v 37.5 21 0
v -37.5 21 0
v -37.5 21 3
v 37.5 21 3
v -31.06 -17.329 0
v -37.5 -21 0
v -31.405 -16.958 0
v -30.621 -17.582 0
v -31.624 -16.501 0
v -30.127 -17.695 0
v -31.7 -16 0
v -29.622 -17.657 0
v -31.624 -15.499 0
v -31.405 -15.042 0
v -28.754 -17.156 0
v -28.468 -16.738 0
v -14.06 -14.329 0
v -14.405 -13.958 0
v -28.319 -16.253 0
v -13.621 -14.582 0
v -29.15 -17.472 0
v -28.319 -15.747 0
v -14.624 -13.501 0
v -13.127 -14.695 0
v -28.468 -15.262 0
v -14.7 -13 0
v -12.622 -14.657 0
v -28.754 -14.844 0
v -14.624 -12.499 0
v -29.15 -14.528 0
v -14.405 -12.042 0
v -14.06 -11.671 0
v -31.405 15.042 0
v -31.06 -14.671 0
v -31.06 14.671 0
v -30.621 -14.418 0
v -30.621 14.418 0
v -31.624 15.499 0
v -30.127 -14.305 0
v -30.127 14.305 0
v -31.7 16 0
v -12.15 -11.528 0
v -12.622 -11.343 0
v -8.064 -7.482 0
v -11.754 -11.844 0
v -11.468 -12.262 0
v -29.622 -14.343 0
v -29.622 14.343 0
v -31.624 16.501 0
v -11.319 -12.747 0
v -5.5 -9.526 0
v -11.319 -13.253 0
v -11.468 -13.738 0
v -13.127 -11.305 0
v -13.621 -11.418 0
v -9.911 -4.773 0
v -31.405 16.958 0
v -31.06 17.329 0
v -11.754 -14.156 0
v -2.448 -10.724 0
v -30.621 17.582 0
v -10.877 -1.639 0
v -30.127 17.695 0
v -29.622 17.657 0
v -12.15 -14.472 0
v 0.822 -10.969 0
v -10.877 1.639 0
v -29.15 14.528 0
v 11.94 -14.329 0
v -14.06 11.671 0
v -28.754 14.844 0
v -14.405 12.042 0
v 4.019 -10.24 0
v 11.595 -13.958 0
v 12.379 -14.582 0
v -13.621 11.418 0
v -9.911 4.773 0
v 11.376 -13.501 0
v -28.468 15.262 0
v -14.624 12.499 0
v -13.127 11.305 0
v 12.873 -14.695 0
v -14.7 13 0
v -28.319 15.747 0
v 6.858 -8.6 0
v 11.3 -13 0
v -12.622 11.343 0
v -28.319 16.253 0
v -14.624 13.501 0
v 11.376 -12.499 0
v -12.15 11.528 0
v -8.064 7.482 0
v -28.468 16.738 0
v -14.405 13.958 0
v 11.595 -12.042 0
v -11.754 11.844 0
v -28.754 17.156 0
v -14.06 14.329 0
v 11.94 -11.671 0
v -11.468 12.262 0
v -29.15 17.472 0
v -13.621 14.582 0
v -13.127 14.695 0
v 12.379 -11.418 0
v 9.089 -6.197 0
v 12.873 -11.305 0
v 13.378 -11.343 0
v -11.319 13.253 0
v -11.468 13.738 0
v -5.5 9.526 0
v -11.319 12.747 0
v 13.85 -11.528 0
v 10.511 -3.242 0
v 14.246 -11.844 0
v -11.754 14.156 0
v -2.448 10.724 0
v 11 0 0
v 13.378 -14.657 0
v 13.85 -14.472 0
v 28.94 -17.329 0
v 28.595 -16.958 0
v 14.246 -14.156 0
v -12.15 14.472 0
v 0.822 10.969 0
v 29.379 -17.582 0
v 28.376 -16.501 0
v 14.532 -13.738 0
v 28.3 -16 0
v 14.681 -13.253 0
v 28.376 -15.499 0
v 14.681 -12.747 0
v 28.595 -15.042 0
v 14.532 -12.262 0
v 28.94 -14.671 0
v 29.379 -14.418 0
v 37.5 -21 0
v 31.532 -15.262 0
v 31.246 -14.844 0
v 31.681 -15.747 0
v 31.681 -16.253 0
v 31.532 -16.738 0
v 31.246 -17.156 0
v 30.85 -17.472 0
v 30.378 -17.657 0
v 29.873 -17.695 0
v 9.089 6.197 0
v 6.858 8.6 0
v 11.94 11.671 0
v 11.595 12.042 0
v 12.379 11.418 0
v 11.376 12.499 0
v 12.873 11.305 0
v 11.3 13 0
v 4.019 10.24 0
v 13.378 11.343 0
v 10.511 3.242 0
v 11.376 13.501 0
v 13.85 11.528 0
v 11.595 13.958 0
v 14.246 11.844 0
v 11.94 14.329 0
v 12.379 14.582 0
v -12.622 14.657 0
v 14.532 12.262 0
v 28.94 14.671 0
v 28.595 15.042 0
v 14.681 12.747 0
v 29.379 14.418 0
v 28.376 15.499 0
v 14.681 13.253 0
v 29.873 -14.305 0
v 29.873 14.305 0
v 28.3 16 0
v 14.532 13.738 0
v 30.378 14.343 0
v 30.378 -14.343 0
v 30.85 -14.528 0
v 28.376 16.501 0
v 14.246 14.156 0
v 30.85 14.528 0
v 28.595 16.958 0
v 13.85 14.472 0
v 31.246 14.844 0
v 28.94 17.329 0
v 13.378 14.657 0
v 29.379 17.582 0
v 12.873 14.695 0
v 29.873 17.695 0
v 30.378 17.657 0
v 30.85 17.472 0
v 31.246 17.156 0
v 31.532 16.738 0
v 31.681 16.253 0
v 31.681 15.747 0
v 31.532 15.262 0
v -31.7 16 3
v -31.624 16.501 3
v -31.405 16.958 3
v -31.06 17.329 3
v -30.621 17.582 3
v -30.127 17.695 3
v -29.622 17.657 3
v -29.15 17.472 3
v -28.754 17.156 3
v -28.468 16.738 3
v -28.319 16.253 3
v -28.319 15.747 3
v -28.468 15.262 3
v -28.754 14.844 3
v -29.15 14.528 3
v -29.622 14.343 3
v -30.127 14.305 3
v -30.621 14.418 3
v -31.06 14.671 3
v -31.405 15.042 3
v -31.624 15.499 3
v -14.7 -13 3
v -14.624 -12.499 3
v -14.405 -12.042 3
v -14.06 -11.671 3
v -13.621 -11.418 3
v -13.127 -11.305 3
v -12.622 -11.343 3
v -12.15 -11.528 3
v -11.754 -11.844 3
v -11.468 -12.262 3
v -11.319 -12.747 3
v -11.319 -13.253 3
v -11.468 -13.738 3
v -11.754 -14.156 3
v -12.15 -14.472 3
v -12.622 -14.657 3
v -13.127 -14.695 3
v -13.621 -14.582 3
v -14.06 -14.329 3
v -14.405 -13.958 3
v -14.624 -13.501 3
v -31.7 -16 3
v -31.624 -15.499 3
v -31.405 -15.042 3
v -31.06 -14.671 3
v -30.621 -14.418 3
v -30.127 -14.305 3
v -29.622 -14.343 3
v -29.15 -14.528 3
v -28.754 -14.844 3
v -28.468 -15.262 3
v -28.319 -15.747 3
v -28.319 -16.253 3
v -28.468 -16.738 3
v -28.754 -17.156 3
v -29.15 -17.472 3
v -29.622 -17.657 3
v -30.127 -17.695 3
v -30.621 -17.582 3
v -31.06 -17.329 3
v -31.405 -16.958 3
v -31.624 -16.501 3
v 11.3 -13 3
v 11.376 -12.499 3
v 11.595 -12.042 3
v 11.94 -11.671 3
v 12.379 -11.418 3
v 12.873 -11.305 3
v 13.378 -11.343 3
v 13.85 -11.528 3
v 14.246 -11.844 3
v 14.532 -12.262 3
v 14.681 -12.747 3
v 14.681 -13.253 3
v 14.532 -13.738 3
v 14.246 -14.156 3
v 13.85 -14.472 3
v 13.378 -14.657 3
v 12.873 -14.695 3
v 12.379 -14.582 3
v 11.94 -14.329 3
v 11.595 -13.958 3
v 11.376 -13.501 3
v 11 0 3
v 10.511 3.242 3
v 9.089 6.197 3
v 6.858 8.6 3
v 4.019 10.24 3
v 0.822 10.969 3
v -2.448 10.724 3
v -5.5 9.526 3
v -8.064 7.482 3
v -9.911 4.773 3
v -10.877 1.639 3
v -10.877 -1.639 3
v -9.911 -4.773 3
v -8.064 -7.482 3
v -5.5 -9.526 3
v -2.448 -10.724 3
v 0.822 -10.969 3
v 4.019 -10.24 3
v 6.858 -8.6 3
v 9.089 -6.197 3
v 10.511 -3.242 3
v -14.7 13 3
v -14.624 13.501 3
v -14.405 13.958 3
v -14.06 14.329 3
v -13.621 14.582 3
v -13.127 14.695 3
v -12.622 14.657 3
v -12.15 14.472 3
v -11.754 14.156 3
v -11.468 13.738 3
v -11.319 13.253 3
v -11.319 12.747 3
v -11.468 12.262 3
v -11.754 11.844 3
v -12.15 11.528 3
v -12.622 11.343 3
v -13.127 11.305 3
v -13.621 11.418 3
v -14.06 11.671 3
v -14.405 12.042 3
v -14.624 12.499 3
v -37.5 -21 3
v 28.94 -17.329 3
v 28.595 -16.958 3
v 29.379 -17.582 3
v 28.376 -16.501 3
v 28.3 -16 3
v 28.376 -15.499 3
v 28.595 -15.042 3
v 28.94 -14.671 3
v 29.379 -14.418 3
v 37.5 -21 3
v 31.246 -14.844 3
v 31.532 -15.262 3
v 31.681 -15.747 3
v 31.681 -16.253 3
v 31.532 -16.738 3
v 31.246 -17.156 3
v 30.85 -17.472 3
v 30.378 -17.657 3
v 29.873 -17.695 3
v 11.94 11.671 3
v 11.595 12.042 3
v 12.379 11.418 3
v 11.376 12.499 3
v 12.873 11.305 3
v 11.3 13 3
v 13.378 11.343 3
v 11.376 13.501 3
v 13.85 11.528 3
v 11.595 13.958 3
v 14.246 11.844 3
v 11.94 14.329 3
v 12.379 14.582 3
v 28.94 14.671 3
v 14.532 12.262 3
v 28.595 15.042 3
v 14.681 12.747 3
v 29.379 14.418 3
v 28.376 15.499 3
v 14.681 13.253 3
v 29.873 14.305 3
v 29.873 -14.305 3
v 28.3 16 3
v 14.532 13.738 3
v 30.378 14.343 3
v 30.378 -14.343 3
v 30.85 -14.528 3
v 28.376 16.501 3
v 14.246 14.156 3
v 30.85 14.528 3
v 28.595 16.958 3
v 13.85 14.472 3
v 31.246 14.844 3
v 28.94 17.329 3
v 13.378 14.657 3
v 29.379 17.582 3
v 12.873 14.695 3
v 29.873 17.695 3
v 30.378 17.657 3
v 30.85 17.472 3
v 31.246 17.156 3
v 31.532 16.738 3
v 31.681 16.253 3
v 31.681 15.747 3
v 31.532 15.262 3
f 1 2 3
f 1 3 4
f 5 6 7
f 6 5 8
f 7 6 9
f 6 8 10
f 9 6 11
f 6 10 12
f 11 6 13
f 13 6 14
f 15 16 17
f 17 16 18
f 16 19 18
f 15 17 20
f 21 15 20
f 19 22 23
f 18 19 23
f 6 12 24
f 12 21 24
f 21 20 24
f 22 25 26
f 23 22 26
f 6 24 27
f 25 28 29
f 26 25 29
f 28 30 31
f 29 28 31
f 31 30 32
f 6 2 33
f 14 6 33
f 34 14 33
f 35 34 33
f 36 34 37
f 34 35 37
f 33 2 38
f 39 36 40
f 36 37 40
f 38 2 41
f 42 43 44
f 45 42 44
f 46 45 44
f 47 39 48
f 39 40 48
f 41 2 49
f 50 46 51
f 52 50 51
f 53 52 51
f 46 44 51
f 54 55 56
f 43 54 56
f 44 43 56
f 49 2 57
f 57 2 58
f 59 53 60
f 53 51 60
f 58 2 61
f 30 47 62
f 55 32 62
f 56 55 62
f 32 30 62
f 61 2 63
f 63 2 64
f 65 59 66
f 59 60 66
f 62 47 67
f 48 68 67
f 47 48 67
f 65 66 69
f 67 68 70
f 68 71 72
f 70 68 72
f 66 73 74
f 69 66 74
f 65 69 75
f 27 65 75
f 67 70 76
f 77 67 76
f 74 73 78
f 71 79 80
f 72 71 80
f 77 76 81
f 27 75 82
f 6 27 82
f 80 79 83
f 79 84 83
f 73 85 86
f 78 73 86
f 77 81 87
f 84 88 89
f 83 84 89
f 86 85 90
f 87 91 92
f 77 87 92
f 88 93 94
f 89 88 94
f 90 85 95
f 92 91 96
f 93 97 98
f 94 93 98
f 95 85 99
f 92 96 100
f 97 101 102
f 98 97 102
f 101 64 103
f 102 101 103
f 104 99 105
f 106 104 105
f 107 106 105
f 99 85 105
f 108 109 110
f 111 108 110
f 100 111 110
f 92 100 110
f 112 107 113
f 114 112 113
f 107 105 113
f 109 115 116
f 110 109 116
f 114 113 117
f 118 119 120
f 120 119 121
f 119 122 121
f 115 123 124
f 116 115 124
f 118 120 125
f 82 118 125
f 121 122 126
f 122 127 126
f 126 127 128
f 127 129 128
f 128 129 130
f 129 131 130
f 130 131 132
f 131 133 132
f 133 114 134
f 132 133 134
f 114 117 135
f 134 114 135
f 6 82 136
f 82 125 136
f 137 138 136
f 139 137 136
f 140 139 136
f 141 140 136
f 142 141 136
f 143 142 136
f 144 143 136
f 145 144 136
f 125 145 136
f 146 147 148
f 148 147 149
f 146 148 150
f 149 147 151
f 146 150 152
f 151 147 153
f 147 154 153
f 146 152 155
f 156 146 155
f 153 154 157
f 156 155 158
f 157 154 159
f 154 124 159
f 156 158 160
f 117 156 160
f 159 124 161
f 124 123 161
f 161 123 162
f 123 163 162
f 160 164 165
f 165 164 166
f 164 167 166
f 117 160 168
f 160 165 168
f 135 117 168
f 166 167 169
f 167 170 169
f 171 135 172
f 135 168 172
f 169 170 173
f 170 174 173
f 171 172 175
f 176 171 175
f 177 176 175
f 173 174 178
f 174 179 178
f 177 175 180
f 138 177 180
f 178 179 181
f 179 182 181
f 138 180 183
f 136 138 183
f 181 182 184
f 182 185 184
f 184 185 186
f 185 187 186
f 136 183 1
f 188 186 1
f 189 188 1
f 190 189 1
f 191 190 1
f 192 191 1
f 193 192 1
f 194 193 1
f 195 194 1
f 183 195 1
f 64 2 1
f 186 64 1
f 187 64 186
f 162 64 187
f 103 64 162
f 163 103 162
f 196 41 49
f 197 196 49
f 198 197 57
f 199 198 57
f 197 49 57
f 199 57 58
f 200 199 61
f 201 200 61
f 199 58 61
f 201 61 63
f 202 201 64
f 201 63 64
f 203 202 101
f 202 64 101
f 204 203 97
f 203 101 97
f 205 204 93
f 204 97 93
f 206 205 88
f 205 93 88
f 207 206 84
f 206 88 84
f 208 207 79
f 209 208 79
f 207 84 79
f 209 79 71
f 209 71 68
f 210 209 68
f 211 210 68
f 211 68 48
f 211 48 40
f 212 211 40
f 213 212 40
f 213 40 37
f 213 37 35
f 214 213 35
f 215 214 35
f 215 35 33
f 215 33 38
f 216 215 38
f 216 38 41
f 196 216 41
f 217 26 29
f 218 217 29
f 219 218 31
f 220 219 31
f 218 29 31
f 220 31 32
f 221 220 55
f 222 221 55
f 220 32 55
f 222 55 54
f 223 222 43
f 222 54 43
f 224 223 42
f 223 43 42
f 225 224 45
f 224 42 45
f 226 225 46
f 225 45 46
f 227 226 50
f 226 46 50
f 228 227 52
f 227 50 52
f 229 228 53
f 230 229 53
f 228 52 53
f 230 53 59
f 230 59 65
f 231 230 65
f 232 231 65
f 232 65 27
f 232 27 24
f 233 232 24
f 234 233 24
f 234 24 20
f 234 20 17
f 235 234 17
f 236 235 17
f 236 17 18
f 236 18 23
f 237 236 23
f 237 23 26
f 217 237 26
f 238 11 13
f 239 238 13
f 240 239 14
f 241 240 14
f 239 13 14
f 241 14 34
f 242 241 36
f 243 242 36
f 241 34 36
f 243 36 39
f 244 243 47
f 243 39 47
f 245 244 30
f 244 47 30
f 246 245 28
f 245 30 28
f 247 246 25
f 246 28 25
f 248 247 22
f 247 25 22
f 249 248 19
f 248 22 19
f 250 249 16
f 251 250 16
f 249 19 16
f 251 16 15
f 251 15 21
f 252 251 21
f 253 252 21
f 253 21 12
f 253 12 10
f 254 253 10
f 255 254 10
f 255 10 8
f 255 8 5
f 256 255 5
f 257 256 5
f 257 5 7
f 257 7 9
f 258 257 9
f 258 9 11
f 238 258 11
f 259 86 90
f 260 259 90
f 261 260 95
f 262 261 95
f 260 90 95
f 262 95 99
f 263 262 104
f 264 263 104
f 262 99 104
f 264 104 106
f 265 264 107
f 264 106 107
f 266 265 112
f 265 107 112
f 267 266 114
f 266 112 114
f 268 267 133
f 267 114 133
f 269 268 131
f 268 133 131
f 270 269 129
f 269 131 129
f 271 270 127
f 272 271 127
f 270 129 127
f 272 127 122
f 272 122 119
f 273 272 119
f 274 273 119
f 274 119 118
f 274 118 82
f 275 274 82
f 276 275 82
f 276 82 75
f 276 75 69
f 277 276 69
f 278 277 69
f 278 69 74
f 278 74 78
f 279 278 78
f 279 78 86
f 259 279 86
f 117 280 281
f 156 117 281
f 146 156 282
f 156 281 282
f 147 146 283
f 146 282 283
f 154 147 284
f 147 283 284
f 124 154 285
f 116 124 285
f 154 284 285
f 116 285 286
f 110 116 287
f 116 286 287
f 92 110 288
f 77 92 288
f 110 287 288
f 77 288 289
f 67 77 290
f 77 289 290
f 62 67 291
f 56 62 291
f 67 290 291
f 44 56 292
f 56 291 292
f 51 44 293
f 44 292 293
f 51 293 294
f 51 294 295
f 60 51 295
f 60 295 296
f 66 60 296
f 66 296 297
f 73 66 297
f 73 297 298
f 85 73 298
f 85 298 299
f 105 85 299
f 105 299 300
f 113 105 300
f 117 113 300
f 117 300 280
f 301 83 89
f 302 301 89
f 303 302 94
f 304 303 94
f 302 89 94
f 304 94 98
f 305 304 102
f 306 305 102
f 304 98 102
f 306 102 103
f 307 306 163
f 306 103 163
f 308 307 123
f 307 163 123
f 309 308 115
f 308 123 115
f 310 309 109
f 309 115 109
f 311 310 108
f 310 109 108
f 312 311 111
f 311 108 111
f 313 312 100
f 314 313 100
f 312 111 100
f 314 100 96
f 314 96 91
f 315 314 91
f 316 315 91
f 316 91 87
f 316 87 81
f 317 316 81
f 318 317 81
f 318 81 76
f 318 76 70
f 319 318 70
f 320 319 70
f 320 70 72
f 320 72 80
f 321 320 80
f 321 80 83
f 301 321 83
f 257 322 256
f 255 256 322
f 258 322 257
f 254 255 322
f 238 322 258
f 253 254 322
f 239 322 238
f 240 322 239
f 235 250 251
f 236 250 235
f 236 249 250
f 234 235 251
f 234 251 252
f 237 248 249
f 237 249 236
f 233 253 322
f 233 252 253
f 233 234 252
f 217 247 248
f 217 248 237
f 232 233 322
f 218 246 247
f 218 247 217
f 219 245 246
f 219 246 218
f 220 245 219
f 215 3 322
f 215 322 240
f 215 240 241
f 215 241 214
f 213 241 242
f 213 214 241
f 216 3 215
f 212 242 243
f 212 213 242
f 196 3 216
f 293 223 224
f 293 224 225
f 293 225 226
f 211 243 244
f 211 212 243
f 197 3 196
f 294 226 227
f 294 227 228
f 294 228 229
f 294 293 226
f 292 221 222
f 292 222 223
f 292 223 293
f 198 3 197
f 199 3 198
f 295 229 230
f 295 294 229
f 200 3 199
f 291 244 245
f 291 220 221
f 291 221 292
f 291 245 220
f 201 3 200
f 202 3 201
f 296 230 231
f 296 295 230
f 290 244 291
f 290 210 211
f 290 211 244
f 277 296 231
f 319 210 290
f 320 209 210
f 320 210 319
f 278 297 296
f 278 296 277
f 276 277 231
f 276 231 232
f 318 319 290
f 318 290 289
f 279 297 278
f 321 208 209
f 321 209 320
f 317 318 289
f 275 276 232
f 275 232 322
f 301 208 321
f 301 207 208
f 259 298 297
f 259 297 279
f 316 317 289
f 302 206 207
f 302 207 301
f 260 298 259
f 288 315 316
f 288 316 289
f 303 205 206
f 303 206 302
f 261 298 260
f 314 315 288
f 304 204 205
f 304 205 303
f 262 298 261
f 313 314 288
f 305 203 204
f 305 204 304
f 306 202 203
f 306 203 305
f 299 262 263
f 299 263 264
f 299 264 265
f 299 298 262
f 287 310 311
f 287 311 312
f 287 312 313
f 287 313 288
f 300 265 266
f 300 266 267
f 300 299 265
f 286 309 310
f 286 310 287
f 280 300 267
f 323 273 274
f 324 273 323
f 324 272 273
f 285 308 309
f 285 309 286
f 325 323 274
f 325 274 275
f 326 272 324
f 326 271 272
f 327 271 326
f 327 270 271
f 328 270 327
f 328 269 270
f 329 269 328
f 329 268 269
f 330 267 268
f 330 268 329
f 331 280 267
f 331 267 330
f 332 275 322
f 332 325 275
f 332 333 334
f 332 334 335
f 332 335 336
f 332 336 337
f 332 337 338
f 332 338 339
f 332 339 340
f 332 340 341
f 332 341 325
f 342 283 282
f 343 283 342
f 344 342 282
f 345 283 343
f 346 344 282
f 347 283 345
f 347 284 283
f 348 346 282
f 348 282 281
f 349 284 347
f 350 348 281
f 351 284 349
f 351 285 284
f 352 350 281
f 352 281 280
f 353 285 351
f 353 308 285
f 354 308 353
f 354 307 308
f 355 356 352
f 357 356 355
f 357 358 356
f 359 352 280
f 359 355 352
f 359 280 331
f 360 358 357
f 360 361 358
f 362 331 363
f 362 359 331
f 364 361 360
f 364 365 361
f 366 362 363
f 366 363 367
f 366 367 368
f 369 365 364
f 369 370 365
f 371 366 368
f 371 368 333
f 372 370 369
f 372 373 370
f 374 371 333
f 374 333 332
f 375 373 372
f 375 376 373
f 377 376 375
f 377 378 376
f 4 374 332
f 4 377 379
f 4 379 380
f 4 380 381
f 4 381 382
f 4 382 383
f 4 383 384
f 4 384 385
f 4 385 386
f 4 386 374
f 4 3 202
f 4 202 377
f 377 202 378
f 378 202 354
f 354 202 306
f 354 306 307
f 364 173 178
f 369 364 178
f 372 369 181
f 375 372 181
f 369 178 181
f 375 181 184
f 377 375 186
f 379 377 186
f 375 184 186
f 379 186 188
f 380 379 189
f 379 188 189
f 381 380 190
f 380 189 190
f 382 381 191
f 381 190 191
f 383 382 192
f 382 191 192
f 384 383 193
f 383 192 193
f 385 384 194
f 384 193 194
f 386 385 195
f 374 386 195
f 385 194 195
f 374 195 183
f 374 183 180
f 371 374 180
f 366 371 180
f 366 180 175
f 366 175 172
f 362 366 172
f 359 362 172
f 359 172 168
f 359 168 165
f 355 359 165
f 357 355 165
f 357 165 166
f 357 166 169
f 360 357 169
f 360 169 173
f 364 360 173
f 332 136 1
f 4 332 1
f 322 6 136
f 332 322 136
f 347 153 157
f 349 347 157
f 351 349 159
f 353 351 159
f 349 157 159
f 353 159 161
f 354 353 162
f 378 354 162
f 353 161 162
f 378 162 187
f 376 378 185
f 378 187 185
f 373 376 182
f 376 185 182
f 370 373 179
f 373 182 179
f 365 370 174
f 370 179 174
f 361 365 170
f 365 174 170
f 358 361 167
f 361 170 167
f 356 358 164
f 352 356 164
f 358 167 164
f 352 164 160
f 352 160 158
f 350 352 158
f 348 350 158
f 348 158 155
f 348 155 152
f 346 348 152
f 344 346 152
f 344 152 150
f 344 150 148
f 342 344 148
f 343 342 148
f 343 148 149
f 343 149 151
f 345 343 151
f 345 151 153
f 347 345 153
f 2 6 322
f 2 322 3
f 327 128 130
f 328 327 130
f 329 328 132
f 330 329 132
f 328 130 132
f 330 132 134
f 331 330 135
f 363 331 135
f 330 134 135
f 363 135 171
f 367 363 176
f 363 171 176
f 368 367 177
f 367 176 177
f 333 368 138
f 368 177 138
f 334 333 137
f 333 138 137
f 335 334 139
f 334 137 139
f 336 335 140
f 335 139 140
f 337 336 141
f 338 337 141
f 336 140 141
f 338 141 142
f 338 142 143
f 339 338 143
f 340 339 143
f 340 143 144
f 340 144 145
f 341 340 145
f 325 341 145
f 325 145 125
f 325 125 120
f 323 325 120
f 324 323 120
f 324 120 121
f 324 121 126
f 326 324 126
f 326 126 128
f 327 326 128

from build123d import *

# Parameters (mm, degrees)
SKETCH1_W            = 75
SKETCH1_H            = 42
BOSS_EXTRUDE1_DEPTH  = 3
SKETCH2_R            = 11
CUT_EXTRUDE1_DEPTH   = 4
M3_CLEARANCE_HOLE1_D = 3.4
M3_CLEARANCE_HOLE2_D = 3.4


with BuildPart() as part:
    # Sketch1 → Boss-Extrude1 (new body)
    with BuildSketch(Plane.XY):
        Rectangle(SKETCH1_W, SKETCH1_H)
    extrude(amount=BOSS_EXTRUDE1_DEPTH)

    # Sketch2 → Cut-Extrude1 (cut, through all)
    with BuildSketch(Plane.XY.offset(3)):
        Circle(SKETCH2_R)
    extrude(amount=-CUT_EXTRUDE1_DEPTH, mode=Mode.SUBTRACT)

    # M3 Clearance Hole1 (through all)
    with Locations(Plane.XY.offset(3)):
        with Locations((-13, -13), (13, -13), (13, 13), (-13, 13)):
            Hole(M3_CLEARANCE_HOLE1_D / 2)

    # M3 Clearance Hole2 (through all)
    with Locations(Plane.XY.offset(3)):
        with Locations((-30, -16), (-30, 16), (30, -16), (30, 16)):
            Hole(M3_CLEARANCE_HOLE2_D / 2)


solid = part.part
